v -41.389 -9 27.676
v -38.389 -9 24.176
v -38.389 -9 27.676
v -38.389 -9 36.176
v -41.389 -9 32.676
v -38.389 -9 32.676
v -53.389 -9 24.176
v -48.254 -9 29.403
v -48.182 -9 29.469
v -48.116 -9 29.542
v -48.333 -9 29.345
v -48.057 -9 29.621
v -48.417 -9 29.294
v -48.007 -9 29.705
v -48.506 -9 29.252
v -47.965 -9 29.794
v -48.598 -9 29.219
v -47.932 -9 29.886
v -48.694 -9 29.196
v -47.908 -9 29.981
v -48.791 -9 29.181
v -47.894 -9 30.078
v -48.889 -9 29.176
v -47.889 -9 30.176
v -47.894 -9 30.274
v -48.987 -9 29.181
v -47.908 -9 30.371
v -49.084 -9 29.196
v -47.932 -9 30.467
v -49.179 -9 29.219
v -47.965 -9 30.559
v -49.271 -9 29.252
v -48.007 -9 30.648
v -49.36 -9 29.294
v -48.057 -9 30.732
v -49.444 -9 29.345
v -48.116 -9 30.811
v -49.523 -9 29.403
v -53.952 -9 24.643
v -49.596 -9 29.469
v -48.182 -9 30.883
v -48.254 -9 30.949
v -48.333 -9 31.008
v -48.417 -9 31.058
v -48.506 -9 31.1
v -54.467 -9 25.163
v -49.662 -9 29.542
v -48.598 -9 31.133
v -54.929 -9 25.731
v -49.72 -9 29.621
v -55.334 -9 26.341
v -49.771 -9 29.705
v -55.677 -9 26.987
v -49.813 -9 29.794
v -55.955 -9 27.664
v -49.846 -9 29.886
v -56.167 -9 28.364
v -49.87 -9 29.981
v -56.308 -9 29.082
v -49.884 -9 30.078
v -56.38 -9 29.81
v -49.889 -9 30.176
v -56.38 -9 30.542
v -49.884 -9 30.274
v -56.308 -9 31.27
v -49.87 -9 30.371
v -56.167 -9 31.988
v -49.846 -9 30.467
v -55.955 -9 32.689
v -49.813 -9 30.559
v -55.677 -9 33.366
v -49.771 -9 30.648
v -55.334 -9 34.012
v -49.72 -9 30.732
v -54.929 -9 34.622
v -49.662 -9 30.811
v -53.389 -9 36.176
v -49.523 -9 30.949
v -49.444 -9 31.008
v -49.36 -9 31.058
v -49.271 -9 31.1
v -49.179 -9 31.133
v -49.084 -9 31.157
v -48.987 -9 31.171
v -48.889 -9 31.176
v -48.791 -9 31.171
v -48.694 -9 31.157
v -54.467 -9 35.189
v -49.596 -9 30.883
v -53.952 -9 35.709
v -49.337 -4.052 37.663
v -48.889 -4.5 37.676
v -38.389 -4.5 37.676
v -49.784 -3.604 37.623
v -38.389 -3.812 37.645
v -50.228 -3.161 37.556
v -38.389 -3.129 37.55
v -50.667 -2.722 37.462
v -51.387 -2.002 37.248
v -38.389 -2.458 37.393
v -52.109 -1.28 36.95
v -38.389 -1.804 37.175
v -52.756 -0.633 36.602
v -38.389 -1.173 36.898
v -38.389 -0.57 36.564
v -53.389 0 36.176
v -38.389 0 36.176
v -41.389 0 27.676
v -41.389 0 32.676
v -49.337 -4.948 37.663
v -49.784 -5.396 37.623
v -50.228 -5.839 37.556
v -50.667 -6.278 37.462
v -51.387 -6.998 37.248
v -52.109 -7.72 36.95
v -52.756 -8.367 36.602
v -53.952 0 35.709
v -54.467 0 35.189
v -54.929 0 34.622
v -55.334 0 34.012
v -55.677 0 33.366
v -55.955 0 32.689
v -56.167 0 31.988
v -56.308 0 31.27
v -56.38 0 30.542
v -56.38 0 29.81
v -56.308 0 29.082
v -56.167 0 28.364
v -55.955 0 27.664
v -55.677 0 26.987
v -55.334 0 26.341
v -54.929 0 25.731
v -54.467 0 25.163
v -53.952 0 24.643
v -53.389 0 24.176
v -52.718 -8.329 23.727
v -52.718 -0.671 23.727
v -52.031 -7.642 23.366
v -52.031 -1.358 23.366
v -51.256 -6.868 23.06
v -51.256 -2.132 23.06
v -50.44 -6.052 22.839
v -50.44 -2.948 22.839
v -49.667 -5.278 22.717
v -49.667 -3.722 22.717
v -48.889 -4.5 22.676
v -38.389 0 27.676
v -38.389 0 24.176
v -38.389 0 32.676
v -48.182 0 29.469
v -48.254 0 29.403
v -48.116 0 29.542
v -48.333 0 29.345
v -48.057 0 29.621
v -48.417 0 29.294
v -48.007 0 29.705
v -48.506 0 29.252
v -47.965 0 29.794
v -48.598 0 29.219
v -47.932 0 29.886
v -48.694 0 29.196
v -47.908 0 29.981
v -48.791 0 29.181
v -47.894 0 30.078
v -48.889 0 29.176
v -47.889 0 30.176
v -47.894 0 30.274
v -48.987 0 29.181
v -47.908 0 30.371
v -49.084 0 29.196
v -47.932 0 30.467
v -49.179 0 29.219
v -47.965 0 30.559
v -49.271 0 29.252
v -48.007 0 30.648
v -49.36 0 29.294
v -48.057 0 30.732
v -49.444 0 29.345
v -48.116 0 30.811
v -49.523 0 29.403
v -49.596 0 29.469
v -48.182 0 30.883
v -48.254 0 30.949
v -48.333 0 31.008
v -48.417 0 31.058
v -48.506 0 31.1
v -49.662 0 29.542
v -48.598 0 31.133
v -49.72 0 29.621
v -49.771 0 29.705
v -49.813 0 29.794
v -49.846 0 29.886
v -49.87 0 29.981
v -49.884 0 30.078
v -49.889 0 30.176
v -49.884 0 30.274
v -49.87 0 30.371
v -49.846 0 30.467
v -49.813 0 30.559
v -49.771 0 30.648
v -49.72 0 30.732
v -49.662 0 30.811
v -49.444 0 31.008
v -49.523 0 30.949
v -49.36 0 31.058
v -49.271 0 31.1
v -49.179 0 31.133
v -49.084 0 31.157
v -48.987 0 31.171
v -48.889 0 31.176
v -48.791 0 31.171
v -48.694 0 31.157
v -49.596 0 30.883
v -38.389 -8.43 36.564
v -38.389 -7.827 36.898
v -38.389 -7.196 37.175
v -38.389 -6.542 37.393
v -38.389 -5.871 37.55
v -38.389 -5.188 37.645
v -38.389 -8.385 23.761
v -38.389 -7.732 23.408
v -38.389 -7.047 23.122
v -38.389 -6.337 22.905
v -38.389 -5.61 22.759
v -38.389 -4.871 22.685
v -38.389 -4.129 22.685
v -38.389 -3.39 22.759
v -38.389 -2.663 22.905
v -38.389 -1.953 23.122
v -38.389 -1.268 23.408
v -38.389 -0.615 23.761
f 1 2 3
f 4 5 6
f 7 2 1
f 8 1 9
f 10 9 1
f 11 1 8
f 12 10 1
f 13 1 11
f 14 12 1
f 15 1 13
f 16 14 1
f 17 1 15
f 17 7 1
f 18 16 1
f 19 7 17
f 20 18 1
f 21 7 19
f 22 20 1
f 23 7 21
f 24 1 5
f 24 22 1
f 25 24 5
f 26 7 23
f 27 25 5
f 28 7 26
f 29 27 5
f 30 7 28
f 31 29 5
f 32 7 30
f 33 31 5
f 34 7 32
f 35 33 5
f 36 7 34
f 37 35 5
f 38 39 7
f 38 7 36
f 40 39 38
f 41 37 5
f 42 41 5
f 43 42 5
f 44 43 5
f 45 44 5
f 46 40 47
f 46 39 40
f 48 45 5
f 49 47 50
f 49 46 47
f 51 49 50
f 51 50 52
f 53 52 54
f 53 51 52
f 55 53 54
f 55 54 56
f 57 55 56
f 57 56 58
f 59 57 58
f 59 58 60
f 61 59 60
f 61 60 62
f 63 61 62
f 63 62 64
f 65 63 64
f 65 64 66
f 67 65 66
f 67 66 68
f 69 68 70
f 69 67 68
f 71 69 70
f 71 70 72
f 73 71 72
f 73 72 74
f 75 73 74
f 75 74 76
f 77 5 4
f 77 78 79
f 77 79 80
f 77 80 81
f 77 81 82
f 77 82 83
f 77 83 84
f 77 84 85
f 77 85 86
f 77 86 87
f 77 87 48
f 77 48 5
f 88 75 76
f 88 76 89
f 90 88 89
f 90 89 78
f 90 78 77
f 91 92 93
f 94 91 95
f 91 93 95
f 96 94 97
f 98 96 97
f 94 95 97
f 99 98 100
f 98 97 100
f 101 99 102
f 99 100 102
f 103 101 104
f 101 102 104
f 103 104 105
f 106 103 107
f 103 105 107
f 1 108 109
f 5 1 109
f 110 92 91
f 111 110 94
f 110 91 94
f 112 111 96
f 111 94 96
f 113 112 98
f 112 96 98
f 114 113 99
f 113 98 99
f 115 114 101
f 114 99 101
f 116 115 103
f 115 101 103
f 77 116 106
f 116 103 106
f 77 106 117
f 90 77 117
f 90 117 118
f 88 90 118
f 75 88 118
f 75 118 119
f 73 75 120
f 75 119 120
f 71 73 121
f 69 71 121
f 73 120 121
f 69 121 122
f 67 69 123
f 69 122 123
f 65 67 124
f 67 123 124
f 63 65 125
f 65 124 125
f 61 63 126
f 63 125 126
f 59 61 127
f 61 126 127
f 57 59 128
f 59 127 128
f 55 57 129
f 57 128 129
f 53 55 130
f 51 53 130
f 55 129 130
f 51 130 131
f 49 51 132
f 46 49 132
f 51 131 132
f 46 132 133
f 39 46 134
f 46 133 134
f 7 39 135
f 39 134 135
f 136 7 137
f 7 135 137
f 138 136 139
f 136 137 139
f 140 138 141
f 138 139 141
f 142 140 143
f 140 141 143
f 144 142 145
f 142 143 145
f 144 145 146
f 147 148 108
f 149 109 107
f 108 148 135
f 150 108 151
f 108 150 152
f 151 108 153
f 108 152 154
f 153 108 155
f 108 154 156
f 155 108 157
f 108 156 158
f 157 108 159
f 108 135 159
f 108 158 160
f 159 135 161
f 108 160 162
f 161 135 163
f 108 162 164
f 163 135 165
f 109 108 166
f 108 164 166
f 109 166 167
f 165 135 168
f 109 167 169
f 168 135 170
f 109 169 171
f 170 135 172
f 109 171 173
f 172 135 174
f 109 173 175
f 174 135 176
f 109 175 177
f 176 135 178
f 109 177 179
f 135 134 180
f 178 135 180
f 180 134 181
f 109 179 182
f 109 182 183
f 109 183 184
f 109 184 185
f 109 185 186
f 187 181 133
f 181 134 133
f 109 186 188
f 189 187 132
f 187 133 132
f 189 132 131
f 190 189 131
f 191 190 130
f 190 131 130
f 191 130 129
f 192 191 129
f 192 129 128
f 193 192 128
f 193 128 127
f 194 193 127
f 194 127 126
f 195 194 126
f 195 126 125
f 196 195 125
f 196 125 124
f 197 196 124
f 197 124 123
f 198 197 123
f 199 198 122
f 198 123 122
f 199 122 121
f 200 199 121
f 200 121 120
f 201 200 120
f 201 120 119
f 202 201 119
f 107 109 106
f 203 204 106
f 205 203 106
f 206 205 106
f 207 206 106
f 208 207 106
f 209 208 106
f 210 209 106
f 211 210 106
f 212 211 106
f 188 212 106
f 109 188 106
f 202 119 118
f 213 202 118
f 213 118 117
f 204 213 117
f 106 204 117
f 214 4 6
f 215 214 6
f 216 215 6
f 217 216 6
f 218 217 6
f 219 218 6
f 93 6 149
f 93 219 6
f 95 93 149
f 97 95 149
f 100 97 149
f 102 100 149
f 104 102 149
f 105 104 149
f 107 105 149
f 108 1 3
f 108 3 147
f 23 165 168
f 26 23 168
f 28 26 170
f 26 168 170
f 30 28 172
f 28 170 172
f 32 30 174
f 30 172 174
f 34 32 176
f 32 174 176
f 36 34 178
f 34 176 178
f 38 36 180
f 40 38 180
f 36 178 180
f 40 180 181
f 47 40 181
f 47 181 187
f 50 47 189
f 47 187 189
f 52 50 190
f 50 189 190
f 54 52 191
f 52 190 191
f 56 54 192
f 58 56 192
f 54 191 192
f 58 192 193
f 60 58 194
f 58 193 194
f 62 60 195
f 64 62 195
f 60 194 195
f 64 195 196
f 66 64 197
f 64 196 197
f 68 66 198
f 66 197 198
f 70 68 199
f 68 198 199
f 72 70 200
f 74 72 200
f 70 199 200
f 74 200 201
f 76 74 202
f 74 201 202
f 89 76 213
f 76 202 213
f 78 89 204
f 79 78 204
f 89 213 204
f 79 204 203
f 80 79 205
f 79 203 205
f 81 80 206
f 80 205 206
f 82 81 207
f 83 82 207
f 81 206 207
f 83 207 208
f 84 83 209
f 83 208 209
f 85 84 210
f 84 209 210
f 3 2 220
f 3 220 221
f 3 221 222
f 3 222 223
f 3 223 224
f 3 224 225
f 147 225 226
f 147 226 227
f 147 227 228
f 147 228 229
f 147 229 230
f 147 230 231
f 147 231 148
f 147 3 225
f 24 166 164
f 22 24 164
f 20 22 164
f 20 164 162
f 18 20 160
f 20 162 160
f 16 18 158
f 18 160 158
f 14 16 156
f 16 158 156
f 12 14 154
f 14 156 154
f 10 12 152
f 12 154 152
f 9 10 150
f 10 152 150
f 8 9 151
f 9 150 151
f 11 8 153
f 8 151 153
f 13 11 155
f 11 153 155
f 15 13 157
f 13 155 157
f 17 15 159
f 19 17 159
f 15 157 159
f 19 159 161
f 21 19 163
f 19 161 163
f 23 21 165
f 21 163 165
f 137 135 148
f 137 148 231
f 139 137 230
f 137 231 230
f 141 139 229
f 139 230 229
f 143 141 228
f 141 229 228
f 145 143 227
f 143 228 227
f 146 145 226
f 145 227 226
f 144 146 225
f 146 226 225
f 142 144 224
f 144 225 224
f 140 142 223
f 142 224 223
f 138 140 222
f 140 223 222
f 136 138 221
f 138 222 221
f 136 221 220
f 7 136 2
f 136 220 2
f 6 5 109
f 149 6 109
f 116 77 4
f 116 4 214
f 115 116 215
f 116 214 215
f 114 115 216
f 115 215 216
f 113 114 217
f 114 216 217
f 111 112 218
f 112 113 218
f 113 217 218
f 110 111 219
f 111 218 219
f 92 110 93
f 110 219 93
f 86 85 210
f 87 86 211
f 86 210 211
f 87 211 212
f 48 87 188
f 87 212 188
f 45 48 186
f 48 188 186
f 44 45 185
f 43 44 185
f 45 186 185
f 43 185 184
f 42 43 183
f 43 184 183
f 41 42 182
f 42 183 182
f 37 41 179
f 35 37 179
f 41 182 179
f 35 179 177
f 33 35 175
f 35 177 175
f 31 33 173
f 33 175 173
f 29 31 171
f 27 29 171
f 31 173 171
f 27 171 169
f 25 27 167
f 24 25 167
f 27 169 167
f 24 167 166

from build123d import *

# Parameters (mm, degrees)
F1_DEPTH = 9
F2_W     = 9
F2_H     = 5
F3_DEPTH = 3
F5_DEPTH = 25


with BuildPart() as f1:
    # F0 (on Front) → F1 (new body)
    with BuildSketch(Plane.XZ):
        with BuildLine():
            Line((-48.888732, 31.176301), (-48.888732, 37.676301))
            ThreePointArc((-48.888732, 37.676301), (-56.388732, 30.176301), (-48.888732, 22.676301))
            Line((-48.888732, 22.676301), (-48.888732, 29.176301))
            ThreePointArc((-48.888732, 29.176301), (-49.888732, 30.176301), (-48.888732, 31.176301))
        make_face()
        with BuildLine():
            ThreePointArc((-48.888732, 22.676301), (-43.585431, 24.873), (-41.388732, 30.176301))
            ThreePointArc((-41.388732, 30.176301), (-43.585431, 35.479602), (-48.888732, 37.676301))
            Line((-48.888732, 37.676301), (-48.888732, 31.176301))
            ThreePointArc((-48.888732, 31.176301), (-48.181625, 30.883408), (-47.888732, 30.176301))
            ThreePointArc((-47.888732, 30.176301), (-48.181625, 29.469194), (-48.888732, 29.176301))
            Line((-48.888732, 29.176301), (-48.888732, 22.676301))
        make_face()
        with BuildLine():
            ThreePointArc((-48.888732, 37.676301), (-43.585431, 35.479602), (-41.388732, 30.176301))
            Line((-41.388732, 30.176301), (-41.388732, 37.676301))
            Line((-41.388732, 37.676301), (-48.888732, 37.676301))
        make_face()
        with BuildLine():
            Line((-41.388732, 22.676301), (-41.388732, 30.176301))
            ThreePointArc((-41.388732, 30.176301), (-43.585431, 24.873), (-48.888732, 22.676301))
            Line((-48.888732, 22.676301), (-41.388732, 22.676301))
        make_face()
    extrude(amount=F1_DEPTH)

    # F2 (on face) → F3 (join)
    with BuildSketch(Plane.YZ.offset(-41.388732)):
        with Locations((-4.5, 35.176301)):
            Rectangle(F2_W, F2_H)
        with Locations((-4.5, 25.176301)):
            Rectangle(F2_W, F2_H)
    extrude(amount=F3_DEPTH)

    # F4 (on face) → F5 (cut)
    with BuildSketch(Plane.YZ.offset(-38.388732)):
        with BuildLine():
            Line((5.874889, 26.795391), (2.194733, 26.795391))
            ThreePointArc((2.194733, 26.795391), (-4.5, 22.676301), (-11.194733, 26.795391))
            Line((-11.194733, 26.795391), (-12.804028, 26.795391))
            Line((-12.804028, 26.795391), (-12.804028, 21.1592))
            Line((-12.804028, 21.1592), (5.874889, 21.1592))
            Line((5.874889, 21.1592), (5.874889, 26.795391))
        make_face()
        with BuildLine():
            ThreePointArc((-4.5, 37.676301), (-2.128292, 37.291426), (0, 36.176301))
            Line((0, 36.176301), (0, 37.676301))
            Line((0, 37.676301), (-4.5, 37.676301))
        make_face()
        with BuildLine():
            ThreePointArc((-9, 36.176301), (-6.871708, 37.291426), (-4.5, 37.676301))
            Line((-4.5, 37.676301), (-9, 37.676301))
            Line((-9, 37.676301), (-9, 36.176301))
        make_face()
    extrude(amount=-F5_DEPTH, mode=Mode.SUBTRACT)


solid = f1.part
